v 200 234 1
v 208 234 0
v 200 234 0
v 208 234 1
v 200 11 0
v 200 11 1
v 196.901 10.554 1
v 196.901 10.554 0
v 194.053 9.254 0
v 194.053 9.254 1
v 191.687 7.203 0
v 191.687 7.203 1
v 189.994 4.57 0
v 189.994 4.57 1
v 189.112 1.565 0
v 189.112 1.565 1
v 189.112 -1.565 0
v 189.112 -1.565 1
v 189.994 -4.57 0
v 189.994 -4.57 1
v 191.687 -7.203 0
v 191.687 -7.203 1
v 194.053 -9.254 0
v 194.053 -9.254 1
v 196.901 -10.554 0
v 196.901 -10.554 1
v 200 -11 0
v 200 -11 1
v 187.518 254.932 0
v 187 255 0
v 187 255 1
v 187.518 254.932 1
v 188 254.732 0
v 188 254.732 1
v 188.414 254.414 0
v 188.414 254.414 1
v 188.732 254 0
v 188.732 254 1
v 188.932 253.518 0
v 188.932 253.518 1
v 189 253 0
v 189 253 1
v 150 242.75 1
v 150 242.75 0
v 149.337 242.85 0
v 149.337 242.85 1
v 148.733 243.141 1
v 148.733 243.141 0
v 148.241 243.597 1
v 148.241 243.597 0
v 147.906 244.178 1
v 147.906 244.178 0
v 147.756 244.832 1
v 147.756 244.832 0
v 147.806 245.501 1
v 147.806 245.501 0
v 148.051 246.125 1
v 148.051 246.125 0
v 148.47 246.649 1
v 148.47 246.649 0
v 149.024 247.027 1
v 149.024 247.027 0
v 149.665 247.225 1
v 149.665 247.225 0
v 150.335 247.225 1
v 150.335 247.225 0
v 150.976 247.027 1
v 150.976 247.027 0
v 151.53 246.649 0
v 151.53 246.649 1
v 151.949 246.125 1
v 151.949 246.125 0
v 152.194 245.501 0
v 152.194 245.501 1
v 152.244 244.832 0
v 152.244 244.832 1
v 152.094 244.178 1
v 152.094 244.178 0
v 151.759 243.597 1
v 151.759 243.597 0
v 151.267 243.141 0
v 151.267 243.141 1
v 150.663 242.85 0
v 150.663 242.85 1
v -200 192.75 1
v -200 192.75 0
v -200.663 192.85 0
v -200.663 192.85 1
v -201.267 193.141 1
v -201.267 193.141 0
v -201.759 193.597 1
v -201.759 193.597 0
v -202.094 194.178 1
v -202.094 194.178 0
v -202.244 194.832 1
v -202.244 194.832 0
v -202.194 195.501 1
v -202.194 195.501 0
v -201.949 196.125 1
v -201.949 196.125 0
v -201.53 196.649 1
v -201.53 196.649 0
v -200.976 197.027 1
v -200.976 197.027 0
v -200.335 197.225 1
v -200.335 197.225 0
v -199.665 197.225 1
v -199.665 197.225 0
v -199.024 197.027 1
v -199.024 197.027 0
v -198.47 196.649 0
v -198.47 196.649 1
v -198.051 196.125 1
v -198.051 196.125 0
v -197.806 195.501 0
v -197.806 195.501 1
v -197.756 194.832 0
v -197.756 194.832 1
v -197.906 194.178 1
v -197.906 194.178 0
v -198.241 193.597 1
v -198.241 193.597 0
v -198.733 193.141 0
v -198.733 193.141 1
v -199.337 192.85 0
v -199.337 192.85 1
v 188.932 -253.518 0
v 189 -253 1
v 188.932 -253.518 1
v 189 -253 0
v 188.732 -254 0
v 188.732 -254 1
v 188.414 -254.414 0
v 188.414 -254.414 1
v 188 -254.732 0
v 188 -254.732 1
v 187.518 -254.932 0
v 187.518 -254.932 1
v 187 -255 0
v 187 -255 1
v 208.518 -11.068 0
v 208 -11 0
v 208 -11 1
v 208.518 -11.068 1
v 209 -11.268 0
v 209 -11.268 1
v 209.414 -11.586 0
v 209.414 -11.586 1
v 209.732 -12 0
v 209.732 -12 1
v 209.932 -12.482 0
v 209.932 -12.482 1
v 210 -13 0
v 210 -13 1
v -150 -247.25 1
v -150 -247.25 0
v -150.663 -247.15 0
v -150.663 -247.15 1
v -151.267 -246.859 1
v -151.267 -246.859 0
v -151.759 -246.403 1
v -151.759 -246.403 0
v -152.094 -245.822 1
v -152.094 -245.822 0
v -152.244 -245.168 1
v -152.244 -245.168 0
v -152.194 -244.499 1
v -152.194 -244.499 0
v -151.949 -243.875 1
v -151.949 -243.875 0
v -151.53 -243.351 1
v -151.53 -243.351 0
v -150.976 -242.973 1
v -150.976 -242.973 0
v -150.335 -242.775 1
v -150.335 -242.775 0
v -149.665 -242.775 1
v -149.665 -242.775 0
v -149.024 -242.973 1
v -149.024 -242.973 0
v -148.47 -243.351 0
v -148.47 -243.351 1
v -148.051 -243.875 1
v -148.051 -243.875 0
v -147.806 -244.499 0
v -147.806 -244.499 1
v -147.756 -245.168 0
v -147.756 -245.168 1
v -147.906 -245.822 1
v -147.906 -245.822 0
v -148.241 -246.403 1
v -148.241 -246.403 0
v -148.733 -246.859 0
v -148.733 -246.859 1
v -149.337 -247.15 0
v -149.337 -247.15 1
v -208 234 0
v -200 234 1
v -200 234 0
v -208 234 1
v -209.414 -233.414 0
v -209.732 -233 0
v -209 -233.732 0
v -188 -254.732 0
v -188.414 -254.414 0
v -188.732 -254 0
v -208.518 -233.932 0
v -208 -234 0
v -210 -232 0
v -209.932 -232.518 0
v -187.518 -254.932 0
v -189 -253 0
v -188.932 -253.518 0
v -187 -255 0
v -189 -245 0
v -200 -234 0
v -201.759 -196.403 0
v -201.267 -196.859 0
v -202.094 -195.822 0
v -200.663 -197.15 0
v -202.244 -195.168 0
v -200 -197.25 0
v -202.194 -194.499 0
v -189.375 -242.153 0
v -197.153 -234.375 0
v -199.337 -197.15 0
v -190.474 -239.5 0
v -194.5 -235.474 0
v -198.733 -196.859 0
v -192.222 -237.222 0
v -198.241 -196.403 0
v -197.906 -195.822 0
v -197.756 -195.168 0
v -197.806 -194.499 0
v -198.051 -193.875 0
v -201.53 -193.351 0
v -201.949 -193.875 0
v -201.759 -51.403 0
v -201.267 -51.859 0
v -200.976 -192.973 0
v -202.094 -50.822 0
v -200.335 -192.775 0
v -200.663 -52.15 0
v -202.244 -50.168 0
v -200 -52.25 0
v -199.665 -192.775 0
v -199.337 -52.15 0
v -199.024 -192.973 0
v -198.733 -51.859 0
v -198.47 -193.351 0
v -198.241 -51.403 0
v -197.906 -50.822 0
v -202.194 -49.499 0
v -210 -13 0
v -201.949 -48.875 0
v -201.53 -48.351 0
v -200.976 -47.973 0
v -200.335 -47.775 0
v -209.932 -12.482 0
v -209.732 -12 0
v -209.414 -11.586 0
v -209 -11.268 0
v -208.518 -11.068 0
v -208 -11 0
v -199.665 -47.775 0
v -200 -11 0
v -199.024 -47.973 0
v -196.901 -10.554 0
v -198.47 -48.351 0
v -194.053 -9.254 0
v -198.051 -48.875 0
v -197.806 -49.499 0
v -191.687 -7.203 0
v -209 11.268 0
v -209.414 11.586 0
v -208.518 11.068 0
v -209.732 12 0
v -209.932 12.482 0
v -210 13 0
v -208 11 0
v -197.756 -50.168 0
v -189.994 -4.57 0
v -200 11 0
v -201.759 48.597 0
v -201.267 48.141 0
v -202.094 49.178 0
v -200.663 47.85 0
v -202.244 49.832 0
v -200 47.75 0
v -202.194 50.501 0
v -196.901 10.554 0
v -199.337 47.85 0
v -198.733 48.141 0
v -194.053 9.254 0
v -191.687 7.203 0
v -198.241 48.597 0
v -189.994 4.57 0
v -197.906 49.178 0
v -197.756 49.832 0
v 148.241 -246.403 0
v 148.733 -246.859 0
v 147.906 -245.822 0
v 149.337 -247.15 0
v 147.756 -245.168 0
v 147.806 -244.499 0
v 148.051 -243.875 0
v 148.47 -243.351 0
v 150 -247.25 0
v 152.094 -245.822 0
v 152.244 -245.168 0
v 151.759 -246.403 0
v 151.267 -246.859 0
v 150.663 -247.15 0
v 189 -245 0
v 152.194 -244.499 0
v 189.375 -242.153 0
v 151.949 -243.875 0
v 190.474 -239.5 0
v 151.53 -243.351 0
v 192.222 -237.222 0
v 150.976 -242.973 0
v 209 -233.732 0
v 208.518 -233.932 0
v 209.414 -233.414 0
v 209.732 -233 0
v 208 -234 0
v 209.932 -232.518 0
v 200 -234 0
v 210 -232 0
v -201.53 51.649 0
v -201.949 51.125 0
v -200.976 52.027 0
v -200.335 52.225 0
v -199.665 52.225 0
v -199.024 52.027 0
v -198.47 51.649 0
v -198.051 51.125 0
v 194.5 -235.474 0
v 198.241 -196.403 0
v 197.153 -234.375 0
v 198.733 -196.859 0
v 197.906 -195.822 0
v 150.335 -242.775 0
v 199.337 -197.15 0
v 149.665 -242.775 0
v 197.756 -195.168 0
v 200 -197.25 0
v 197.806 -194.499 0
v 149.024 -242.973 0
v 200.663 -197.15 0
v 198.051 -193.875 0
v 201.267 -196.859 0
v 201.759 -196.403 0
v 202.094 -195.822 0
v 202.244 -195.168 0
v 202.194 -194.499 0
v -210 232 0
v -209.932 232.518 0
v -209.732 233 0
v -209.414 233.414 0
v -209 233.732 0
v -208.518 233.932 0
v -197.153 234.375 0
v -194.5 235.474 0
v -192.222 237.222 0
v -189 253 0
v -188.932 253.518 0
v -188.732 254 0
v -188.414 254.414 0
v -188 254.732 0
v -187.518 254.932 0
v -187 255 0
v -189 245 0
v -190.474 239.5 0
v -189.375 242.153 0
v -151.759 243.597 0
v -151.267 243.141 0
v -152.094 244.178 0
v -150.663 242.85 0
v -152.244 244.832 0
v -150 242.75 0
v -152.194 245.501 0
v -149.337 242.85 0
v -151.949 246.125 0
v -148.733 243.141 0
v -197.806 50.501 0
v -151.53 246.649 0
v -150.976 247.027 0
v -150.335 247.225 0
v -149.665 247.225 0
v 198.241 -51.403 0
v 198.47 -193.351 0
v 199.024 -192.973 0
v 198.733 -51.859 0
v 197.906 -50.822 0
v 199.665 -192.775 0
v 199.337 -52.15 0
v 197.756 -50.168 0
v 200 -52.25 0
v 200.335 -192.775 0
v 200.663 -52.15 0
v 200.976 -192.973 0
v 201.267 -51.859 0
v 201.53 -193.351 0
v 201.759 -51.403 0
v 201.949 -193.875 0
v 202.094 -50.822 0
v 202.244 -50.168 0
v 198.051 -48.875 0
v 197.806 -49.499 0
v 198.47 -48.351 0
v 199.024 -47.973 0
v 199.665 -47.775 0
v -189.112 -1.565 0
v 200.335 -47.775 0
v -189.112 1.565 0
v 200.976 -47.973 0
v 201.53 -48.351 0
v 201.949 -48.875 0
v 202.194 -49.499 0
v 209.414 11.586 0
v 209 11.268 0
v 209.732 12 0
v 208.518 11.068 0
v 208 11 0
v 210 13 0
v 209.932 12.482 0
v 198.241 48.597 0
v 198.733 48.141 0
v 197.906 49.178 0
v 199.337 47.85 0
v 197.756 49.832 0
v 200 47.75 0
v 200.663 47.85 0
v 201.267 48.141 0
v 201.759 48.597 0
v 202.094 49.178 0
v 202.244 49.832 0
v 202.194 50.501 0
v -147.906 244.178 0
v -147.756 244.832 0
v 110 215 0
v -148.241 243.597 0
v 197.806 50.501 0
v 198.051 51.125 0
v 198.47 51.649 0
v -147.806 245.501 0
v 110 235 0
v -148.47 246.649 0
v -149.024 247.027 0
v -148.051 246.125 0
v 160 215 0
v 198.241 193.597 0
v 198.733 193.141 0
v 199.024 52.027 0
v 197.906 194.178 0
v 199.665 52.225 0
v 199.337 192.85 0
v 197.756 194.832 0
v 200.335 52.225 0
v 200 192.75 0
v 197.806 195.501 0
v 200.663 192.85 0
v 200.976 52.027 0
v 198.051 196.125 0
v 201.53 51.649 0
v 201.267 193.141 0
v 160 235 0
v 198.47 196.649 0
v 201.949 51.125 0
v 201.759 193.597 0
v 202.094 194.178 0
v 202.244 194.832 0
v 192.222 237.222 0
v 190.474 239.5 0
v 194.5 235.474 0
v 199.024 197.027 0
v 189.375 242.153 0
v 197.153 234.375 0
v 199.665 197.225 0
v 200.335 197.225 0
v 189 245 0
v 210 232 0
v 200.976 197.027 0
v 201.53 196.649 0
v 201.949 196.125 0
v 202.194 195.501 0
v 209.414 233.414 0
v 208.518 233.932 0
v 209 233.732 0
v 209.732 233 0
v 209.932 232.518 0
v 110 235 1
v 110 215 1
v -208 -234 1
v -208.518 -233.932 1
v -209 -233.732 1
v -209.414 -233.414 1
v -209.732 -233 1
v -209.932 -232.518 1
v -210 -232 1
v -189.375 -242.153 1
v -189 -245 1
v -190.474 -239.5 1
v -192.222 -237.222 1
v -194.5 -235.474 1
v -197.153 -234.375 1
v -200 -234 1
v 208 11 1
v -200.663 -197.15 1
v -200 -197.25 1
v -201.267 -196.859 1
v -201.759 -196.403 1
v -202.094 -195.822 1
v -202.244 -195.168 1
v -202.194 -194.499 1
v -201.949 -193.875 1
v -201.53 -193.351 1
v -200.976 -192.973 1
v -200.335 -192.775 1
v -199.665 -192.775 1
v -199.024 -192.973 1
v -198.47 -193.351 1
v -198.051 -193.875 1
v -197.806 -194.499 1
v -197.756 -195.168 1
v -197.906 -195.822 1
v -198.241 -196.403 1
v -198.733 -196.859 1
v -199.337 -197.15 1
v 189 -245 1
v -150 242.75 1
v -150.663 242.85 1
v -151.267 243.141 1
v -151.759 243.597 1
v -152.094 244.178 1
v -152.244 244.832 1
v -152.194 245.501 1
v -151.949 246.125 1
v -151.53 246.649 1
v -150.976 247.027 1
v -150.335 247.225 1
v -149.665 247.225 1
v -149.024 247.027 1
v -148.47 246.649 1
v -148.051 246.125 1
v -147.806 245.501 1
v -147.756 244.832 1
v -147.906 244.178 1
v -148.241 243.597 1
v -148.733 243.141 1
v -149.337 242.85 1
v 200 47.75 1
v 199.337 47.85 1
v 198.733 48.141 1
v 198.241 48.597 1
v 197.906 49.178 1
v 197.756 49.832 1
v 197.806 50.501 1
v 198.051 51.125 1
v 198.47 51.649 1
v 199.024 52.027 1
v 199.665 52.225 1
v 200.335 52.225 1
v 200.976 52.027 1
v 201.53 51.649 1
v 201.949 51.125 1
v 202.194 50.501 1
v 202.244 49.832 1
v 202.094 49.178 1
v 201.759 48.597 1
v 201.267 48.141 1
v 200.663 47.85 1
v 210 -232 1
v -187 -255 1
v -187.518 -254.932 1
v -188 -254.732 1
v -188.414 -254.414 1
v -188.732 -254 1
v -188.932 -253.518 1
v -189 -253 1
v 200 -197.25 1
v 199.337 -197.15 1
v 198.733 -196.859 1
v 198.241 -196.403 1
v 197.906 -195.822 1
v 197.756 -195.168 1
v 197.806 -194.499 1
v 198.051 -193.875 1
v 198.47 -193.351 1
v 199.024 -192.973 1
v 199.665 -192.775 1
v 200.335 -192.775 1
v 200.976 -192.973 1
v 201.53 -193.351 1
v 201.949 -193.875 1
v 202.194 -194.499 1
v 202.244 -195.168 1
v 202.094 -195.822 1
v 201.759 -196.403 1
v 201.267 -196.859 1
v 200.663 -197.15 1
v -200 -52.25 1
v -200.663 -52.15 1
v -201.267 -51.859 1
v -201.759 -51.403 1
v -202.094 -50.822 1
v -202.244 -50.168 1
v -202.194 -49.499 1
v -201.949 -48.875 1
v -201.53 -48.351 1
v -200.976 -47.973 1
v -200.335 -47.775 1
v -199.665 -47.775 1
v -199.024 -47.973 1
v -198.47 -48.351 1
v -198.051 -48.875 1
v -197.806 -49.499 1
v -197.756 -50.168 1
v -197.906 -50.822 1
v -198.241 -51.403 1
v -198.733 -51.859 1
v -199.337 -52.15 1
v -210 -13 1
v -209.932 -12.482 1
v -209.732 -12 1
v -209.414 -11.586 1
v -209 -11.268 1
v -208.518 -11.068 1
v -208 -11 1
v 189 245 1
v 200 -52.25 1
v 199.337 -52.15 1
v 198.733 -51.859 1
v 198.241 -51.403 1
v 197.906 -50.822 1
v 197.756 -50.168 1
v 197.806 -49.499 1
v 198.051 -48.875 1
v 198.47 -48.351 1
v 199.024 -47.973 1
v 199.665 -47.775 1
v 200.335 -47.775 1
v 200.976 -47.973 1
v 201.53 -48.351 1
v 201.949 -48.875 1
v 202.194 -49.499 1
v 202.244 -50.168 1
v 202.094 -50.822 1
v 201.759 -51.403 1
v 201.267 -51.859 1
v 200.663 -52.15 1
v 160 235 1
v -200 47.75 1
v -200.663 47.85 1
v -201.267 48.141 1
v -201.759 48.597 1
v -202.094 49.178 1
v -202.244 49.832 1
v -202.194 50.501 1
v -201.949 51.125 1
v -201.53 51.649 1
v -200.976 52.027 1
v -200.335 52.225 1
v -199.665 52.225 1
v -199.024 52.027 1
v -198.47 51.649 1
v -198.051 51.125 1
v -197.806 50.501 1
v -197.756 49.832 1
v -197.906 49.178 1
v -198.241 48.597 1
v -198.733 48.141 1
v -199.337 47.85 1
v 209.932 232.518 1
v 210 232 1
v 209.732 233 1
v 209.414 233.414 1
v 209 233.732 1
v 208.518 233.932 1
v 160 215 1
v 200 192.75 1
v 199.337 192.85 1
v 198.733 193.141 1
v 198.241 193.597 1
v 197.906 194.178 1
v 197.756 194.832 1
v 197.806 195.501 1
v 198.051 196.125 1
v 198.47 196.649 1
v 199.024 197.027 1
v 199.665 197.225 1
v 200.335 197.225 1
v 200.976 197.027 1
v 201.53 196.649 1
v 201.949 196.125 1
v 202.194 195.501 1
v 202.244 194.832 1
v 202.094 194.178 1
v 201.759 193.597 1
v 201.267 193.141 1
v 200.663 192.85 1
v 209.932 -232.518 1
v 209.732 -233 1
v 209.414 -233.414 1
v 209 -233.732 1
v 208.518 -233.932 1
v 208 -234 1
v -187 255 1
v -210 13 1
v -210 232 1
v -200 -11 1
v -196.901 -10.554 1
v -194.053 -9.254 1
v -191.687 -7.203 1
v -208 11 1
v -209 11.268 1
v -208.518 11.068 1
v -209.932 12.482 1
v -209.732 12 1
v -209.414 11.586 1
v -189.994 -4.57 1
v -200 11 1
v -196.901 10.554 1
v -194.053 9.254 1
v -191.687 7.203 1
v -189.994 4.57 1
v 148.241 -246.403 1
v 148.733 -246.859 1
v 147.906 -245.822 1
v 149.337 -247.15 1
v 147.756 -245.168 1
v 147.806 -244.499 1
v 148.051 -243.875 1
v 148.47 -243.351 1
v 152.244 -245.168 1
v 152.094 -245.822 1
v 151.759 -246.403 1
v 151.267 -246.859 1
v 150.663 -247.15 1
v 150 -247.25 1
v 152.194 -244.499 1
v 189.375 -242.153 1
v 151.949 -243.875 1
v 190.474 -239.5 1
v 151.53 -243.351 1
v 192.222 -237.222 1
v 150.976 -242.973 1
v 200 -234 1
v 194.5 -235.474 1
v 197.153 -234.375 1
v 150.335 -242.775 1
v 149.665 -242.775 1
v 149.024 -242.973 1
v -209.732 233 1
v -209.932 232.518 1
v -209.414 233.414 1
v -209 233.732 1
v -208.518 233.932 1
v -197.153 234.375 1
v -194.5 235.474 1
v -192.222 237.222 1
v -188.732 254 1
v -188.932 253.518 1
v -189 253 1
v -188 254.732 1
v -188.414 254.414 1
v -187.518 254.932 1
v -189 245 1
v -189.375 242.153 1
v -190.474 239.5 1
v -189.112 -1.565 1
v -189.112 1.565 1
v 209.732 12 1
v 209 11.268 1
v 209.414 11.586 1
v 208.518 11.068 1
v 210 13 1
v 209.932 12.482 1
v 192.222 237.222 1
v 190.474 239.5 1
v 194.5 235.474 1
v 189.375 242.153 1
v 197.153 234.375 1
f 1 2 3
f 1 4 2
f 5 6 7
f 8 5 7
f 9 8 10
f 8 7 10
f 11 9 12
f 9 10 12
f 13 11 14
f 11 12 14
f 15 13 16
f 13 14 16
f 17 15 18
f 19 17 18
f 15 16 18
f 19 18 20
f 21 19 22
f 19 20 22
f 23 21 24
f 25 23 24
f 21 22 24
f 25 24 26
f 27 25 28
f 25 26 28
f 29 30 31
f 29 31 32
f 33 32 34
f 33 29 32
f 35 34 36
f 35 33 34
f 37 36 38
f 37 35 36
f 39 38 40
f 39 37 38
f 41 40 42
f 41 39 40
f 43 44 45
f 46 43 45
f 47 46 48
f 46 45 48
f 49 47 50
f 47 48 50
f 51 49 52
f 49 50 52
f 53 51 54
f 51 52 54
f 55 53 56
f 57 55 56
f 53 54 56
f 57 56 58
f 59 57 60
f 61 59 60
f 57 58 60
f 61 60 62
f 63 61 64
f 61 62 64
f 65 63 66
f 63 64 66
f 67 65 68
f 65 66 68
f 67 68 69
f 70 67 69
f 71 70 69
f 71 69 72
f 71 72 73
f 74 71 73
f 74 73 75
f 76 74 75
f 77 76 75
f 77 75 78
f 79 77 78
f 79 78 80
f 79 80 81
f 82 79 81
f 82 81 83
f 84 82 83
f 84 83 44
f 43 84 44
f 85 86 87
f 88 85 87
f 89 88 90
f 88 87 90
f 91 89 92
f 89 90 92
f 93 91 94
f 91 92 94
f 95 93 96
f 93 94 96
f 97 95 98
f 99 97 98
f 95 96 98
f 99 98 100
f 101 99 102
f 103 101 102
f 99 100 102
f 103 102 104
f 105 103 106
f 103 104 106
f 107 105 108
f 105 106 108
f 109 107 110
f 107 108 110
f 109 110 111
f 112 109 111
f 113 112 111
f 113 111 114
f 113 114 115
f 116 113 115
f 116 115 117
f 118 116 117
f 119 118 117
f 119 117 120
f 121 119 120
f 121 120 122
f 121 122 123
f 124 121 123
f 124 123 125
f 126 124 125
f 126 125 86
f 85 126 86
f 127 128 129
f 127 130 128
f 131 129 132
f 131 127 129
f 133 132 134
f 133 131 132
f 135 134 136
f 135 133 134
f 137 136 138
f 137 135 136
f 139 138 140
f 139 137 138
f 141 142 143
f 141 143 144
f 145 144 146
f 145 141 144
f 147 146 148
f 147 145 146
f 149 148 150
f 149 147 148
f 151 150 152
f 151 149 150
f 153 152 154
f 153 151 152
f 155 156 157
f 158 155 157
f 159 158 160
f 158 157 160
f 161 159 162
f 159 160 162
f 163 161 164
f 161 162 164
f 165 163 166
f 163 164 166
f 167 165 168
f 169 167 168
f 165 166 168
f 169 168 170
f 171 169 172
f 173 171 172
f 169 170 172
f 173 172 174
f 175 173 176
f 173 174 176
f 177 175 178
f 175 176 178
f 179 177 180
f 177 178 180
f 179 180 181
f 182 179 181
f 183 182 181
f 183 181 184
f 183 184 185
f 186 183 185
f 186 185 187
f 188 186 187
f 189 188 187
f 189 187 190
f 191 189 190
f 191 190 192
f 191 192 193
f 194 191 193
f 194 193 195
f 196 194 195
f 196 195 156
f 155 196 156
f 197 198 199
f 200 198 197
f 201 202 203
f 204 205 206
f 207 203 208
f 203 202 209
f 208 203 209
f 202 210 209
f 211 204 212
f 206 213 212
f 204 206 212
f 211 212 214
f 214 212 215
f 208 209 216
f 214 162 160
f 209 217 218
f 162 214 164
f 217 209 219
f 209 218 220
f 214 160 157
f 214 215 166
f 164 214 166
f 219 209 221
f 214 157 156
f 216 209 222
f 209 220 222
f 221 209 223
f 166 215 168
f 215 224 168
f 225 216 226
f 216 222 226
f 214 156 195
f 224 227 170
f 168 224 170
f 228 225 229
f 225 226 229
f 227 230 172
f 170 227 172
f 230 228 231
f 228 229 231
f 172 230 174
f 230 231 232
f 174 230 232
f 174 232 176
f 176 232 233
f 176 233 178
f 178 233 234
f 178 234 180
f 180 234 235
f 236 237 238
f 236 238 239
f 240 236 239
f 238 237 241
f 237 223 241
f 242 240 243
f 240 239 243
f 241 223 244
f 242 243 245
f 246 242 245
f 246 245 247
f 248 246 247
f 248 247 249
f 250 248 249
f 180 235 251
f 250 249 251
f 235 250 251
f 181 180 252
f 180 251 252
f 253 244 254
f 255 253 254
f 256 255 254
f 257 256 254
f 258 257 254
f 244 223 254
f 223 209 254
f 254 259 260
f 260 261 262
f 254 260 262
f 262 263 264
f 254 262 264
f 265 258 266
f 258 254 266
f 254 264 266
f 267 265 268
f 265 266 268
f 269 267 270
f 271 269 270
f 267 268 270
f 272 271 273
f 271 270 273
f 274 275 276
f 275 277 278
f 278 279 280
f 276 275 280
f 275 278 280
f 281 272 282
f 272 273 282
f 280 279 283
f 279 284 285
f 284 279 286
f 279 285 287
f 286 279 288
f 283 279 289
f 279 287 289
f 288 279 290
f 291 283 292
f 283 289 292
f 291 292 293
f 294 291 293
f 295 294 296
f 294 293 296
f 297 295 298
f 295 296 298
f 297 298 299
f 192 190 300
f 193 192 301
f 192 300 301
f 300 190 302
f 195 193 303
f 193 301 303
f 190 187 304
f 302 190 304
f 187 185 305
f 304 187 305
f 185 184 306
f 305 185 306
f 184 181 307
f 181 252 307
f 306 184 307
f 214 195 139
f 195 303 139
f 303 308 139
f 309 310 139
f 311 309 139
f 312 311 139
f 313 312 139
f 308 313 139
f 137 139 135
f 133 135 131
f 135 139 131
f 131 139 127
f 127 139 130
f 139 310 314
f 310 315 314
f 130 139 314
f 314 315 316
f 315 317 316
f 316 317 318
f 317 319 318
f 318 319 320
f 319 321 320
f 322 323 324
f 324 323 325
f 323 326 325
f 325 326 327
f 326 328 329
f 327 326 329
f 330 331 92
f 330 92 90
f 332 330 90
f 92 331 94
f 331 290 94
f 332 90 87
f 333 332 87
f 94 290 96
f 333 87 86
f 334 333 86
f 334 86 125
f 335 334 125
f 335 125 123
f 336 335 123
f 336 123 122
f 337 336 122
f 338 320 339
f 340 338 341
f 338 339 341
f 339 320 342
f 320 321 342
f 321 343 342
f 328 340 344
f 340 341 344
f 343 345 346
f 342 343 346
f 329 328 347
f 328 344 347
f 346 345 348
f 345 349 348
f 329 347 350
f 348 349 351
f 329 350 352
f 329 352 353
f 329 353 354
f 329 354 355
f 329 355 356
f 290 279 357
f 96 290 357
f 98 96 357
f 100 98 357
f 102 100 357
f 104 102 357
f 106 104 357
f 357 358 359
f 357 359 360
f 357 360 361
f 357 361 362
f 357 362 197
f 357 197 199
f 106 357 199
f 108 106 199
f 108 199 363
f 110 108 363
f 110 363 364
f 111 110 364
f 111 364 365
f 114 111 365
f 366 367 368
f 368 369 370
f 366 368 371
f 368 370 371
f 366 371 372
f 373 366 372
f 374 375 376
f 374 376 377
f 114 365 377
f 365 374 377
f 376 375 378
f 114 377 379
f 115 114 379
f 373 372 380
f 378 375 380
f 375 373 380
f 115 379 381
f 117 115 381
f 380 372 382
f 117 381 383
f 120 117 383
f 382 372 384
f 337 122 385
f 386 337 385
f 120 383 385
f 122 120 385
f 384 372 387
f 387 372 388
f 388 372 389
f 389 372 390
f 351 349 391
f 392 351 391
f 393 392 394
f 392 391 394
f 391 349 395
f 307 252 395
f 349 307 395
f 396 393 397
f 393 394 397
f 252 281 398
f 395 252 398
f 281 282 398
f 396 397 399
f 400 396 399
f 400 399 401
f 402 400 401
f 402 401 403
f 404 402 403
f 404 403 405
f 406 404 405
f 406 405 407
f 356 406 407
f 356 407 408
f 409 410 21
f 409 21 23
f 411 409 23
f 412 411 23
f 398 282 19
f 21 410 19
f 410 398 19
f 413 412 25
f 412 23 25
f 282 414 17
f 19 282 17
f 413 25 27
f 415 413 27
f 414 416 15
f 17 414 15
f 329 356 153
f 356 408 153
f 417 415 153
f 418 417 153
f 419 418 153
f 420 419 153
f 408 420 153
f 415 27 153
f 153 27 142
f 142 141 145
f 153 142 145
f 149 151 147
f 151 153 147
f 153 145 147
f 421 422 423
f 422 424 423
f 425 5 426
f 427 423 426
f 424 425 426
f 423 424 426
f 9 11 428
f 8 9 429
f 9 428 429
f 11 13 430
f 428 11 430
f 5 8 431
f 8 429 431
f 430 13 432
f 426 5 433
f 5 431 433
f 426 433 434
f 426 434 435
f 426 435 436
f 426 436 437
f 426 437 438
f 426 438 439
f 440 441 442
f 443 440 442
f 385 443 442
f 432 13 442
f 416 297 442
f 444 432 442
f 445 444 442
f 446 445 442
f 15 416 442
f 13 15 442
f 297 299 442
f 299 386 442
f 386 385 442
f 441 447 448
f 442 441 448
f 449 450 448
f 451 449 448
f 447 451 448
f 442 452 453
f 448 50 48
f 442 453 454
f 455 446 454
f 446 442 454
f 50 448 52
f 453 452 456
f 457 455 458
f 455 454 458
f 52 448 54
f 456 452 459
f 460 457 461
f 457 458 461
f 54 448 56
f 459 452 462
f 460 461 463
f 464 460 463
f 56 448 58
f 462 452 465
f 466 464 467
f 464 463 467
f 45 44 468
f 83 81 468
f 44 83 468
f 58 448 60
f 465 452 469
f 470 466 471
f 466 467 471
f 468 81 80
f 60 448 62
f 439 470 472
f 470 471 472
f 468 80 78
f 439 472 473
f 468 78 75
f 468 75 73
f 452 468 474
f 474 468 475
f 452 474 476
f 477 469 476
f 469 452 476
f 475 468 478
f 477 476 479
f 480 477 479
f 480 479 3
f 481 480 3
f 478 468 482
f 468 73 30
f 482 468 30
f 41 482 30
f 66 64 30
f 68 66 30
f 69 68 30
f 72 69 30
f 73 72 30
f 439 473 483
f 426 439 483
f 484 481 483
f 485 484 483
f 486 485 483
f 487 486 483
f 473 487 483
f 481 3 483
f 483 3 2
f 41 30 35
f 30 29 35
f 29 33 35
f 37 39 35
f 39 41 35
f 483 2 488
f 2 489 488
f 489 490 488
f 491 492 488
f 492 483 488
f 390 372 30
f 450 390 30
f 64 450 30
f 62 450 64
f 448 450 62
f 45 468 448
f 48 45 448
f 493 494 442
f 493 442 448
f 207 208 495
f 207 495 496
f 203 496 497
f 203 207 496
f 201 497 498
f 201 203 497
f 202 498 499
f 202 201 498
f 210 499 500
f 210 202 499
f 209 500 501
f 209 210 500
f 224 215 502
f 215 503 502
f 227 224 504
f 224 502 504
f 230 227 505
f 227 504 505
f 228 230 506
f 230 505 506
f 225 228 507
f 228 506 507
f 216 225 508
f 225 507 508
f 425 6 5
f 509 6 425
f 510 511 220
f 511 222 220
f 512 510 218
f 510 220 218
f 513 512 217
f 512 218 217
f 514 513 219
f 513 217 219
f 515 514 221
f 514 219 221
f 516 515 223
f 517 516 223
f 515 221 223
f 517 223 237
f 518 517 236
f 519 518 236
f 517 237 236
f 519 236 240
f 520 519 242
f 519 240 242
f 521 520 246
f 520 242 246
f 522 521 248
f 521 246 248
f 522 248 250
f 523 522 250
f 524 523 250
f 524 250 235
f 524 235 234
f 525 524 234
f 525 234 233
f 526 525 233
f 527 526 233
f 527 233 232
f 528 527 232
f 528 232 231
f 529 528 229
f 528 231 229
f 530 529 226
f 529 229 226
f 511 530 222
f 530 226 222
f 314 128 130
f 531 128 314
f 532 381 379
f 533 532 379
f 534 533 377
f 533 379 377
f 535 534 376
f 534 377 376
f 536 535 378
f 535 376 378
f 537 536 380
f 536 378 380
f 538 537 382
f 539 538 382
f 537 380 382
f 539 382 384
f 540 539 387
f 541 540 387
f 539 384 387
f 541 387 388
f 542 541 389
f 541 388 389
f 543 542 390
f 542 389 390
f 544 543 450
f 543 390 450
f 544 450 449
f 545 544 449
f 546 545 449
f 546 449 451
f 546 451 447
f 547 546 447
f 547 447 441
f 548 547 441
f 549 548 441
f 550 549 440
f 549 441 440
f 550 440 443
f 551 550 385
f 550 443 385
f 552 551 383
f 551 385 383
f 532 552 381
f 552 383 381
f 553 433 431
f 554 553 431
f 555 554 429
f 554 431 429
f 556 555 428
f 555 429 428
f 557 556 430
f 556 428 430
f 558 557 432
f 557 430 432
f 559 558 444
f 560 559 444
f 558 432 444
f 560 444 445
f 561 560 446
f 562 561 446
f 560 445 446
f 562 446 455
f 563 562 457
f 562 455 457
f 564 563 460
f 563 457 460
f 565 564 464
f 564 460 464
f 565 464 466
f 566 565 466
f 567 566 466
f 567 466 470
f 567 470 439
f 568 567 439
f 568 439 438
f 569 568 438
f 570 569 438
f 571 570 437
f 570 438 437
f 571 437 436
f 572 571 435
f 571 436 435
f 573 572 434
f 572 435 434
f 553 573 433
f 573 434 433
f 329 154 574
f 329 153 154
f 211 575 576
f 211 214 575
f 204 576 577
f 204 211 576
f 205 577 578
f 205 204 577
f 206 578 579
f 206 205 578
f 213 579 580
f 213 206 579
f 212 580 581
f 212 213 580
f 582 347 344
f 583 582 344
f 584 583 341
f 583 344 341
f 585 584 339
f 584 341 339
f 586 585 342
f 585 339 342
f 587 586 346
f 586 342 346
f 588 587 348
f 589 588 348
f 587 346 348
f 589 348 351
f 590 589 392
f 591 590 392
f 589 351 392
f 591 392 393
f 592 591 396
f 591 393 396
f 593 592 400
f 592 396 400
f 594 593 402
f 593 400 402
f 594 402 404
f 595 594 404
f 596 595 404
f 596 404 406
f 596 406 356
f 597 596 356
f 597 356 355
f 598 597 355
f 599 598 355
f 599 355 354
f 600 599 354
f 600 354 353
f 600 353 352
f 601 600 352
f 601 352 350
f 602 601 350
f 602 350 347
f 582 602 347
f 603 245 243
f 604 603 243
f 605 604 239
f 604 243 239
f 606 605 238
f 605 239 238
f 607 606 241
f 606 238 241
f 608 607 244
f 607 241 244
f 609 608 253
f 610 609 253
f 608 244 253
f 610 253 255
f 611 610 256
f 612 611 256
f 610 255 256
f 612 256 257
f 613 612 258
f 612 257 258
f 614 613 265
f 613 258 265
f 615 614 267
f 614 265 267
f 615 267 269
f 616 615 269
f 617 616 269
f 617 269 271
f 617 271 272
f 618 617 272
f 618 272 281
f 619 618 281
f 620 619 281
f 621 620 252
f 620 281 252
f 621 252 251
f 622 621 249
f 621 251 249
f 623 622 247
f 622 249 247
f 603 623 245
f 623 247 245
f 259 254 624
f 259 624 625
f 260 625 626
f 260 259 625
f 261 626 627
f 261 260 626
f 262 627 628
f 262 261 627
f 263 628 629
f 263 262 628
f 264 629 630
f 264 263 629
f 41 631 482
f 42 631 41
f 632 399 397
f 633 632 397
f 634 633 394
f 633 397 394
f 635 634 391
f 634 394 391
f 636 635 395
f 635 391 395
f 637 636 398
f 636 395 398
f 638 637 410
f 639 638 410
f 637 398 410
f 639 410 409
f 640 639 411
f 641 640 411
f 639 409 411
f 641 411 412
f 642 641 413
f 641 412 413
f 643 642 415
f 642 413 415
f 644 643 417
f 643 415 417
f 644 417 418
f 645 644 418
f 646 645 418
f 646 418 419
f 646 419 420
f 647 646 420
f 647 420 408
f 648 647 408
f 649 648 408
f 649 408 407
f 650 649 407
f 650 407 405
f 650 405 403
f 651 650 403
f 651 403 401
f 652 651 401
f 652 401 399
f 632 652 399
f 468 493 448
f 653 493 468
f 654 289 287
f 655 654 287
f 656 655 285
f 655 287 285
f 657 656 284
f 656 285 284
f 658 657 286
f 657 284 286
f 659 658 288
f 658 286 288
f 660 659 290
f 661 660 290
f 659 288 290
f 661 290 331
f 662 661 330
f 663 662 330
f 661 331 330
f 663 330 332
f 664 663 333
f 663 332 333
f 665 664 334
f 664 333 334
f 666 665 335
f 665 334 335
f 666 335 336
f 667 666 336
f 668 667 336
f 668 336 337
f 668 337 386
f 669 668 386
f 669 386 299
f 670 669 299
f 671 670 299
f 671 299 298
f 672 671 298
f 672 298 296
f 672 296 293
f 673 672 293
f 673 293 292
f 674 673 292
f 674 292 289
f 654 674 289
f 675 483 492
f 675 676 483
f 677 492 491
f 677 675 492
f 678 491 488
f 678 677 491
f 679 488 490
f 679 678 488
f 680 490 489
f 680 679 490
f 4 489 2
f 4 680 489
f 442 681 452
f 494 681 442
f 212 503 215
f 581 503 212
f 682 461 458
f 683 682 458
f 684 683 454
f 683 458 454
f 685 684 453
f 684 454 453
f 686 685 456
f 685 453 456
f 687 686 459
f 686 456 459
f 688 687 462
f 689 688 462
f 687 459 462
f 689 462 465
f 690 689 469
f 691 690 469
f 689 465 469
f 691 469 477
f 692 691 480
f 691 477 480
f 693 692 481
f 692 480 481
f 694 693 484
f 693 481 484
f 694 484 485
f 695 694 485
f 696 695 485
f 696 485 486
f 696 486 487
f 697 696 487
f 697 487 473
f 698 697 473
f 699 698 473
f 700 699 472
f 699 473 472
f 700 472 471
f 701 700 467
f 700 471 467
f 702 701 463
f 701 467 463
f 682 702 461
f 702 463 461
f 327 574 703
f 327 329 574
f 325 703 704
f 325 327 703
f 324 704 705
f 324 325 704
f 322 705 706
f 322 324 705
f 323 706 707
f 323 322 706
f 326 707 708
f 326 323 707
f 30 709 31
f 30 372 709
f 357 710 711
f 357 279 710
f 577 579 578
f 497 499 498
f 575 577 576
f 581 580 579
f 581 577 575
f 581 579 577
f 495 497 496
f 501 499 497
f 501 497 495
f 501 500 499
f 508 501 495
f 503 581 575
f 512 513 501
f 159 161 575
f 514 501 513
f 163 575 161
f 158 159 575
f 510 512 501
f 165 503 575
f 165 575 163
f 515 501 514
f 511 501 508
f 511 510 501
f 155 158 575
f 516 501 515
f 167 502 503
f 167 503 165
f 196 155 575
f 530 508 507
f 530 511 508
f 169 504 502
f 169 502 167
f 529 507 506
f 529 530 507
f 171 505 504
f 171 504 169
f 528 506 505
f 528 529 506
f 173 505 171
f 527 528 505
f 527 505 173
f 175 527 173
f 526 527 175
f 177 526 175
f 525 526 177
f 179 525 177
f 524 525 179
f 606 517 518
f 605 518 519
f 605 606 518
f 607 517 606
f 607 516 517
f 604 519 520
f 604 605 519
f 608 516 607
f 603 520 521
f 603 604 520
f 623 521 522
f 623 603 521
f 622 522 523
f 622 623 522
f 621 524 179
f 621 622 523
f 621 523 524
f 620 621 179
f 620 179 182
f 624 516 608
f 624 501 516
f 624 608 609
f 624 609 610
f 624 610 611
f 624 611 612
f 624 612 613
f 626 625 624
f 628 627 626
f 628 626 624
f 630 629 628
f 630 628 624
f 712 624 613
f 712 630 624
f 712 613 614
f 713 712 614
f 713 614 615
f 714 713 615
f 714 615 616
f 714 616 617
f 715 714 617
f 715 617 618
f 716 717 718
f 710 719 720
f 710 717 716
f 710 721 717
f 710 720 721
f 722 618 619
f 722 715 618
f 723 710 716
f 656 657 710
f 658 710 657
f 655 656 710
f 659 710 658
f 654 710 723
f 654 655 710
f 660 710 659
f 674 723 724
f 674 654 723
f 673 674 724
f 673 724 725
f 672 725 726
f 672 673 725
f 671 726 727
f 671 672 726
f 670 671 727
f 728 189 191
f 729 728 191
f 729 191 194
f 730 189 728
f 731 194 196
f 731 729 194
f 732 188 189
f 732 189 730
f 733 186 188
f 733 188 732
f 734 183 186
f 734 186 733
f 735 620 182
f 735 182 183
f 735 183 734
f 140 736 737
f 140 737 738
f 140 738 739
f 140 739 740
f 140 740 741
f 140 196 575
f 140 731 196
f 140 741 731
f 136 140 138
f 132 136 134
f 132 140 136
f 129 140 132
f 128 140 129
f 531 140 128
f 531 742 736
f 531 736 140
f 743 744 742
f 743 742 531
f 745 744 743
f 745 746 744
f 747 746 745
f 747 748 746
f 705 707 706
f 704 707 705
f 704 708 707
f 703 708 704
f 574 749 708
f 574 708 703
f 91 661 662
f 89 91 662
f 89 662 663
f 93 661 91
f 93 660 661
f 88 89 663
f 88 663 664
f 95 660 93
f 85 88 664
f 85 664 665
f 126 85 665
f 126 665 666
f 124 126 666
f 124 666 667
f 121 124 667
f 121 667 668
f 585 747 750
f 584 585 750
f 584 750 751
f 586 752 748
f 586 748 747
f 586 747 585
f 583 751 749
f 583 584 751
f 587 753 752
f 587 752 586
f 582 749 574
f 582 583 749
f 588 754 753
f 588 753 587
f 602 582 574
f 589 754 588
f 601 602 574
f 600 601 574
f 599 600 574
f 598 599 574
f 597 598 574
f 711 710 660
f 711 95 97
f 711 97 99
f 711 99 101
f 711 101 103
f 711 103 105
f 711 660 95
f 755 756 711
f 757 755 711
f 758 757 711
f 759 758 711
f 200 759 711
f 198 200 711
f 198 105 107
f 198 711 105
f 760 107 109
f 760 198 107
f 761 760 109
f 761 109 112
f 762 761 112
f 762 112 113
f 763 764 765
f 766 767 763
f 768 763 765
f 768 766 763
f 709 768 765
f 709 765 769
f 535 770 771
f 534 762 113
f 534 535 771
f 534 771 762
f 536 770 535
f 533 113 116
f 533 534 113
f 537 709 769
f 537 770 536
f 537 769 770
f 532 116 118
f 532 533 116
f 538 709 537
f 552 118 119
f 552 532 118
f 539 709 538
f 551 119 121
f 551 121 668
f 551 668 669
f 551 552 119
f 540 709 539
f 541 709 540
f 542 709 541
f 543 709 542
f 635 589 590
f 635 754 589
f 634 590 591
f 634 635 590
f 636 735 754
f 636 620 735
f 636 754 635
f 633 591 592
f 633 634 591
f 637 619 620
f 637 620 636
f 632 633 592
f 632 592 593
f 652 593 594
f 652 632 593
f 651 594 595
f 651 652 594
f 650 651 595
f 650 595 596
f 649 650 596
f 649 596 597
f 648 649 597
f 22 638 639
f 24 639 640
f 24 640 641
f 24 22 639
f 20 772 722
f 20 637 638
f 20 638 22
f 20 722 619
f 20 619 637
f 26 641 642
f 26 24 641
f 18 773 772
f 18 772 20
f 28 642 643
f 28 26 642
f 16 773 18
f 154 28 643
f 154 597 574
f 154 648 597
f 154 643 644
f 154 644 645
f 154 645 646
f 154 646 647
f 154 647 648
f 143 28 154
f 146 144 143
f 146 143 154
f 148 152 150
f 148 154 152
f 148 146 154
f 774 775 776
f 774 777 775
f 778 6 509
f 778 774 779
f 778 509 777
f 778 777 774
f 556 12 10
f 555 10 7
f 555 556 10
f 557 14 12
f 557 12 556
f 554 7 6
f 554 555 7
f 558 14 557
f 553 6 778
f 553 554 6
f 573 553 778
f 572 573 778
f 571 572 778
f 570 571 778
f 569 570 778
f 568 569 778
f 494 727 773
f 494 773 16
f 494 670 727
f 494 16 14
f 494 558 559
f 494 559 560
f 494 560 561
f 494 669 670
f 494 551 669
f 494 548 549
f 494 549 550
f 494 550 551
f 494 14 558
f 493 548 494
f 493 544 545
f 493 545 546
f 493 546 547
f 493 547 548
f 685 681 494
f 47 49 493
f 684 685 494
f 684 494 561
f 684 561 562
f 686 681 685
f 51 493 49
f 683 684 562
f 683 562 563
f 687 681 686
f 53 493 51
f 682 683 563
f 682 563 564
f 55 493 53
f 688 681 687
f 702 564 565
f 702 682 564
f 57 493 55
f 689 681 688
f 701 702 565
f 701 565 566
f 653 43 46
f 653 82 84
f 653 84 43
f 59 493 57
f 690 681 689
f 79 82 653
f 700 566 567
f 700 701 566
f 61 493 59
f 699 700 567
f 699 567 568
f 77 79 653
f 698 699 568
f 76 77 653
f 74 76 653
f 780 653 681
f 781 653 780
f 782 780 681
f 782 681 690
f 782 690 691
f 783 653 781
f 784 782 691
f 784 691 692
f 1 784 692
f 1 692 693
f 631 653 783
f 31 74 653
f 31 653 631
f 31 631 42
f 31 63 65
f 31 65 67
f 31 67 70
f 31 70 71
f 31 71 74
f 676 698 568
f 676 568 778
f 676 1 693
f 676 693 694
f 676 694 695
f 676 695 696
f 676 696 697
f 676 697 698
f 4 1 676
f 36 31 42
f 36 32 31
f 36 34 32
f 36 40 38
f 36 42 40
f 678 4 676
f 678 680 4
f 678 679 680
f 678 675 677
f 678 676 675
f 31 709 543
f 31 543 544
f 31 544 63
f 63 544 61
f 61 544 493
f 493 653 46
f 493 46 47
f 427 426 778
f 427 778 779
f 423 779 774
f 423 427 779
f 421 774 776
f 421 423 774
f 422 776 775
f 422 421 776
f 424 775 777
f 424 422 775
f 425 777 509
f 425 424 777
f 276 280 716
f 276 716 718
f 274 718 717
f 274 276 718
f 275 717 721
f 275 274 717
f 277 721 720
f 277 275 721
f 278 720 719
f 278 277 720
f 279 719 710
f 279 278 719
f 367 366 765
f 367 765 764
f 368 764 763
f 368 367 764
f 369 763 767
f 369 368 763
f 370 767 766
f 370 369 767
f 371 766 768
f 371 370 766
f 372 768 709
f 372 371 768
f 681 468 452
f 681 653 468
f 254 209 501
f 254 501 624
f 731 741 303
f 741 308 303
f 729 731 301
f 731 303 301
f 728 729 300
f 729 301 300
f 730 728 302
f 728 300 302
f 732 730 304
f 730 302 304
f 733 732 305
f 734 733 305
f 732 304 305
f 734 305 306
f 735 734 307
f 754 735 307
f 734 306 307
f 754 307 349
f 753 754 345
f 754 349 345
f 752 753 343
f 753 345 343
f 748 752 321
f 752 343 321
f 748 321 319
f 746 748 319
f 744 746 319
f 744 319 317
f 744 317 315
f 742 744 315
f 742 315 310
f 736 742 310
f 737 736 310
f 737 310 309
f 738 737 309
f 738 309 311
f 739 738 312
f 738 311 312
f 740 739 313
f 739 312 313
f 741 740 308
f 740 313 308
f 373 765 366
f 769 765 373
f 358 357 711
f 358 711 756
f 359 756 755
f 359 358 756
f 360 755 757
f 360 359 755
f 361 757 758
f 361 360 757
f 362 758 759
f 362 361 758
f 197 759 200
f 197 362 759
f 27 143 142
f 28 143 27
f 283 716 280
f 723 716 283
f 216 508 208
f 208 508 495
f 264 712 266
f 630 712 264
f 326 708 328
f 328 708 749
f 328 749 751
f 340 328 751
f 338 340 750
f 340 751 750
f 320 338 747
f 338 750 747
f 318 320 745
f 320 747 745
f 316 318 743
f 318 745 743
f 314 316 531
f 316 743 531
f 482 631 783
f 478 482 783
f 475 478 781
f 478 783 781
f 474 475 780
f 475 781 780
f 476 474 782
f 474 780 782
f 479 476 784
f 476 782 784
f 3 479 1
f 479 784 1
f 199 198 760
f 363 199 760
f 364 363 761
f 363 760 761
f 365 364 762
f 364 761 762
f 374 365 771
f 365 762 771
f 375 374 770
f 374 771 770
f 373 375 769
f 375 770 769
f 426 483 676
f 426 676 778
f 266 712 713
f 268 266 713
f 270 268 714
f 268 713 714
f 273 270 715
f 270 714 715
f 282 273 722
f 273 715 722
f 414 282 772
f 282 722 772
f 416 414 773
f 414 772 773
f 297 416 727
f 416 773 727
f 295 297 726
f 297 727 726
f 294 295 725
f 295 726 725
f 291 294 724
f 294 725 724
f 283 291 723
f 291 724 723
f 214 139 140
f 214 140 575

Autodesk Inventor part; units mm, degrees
ref_plane "YZ Plane" through (0, 0, 0) normal (1, 0, 0) x (0, 1, 0)
ref_plane "XZ Plane" through (0, 0, 0) normal (0, 1, 0) x (-1, 0, 0)
ref_plane "XY Plane" through (0, 0, 0) normal (0, 0, 1) x (1, 0, 0)
sketch "スケッチ1" plane through (0, 0, 0) normal (0, 0, 1) x (1, 0, 0)
  line L0 (210, -255) -> (-210, -255)
  line L1 (-210, -255) -> (-210, 255)
  line L2 (-210, 255) -> (210, 255)
  line L3 (210, 255) -> (210, -255)
  line L4 (210, -255) -> (-210, 255) construction
  line L5 (-210, -255) -> (210, 255) construction
  point P0 (0, 0)
  dimension "d0" = 510
  dimension "d1" = 420
extrude "プレート1" add sketch "スケッチ1" along normal blind 1
sketch "スケッチ2" plane through (0, 0, 1) normal (0, 0, 1) x (1, 0, 0)
  line L0 (-210, -255) -> (-210, 255) projected
  line L1 (210, -255) -> (-210, -255) projected
  line L2 (210, 255) -> (210, -255) projected
  line L3 (-210, 255) -> (210, 255) projected
  line L4 (189, 234) -> (189, -234)
  line L5 (189, -234) -> (-189, -234)
  line L6 (-189, -234) -> (-189, 234)
  line L7 (-189, 234) -> (189, 234)
  line L8 (200, 245) -> (200, -245)
  line L9 (200, -245) -> (-200, -245)
  line L10 (-200, -245) -> (-200, 245)
  line L11 (-200, 245) -> (200, 245)
  circle A0 centre (-200, 245) radius 11
  circle A1 centre (-200, -245) radius 11
  circle A2 centre (200, -245) radius 11
  circle A3 centre (200, 245) radius 11
  circle A4 centre (-200, 0) radius 11
  circle A5 centre (200, 0) radius 11
  line L12 (-296, 11) -> (393, 11)
  line L13 (393, 11) -> (393, -11)
  line L14 (393, -11) -> (-296, -11)
  line L15 (-296, -11) -> (-296, 11)
  line L16 (-292, 336) -> (-189, 336)
  line L17 (-189, 336) -> (-189, -344)
  line L18 (-189, -344) -> (-292, -344)
  line L19 (-292, -344) -> (-292, 336)
  line L20 (354, -311) -> (189, -311)
  line L21 (189, -311) -> (189, 377)
  line L22 (189, 377) -> (354, 377)
  line L23 (354, 377) -> (354, -311)
  line L24 (-371, 292) -> (290, 292)
  line L25 (290, 292) -> (290, 234)
  line L26 (290, 234) -> (-371, 234)
  line L27 (-371, 234) -> (-371, 292)
  line L28 (-371, -325) -> (335, -325)
  line L29 (335, -325) -> (335, -234)
  line L30 (335, -234) -> (-371, -234)
  line L31 (-371, -234) -> (-371, -325)
  point P0 (0, 0)
  point P1 (200, 11)
  point P2 (200, -11)
  point P3 (210, -11)
  point P4 (210, 11)
  point P5 (210, -234)
  point P6 (200, -234)
  point P7 (189, -245)
  point P8 (189, -255)
  point P9 (-189, -245)
  point P10 (-200, -234)
  point P11 (-210, -234)
  point P12 (-189, -255)
  point P13 (-200, 11)
  point P14 (-210, 11)
  point P15 (-210, -11)
  point P16 (-200, -11)
  point P17 (-210, 234)
  point P18 (-200, 234)
  point P19 (-189, 245)
  point P20 (-189, 255)
  point P21 (189, 245)
  point P22 (200, 234)
  point P23 (210, 234)
  point P24 (189, 255)
  point P25 (210, 249.5826)
  point P26 (195.4174, 255)
  point P27 (-189, 245)
  point P28 (189, 245)
  point P29 (200, 234)
  point P30 (200, 234)
  point P31 (204.5826, 255)
  dimension "d3" = 21
  dimension "d4" = 10
  dimension "d5" = 22
  dimension "d6" = 22
  dimension "d7" = 22
  dimension "d8" = 22
  dimension "d9" = 22
  dimension "d10" = 22
extrude "押し出し1" cut sketch "スケッチ2" against normal blind 10 contours L0 A1 L1 | L0 A1 L10 L9 L1 | L0 L30 A1 | A1 L17 L1 | A1 L9 L10 | L0 A4 L14 | A4 L0 L10 | L10 A4 | L21 A2 L1 | A2 L8 L9 | L9 L8 A2 L2 L1 | A4 L0 L12 | L30 L2 A2 | A0 L0 L3 L11 L10 | L26 L0 A0 | L10 L11 A0 | A2 L2 L1 | A5 L8 | L8 A5 L2 | A5 L2 L14 | L26 L27 L24 L19 | L19 L24 L17 L3 A0 L0 L26 | A0 L0 | A0 L3 L17 | L12 L2 A5 | L0 L3 A0 | A3 L3 L2 L8 L11 | L21 L3 A3 | L11 L8 A3 | L3 A0 | L17 L24 L21 L3 | A3 L2 L26 | A3 L3 | L3 L21 L24 L25 L26 L2 A3 | L2 A3 | L3 L2 A3
fillet "フィレット1" radius 2 12 edges at (-210, 11, 0.5) (-210, -11, 0.5) (-210, 234, 0.5) (-189, 255, 0.5) (189, 255, 0.5) (210, 234, 0.5) (210, 11, 0.5) (210, -11, 0.5) (210, -234, 0.5) (189, -255, 0.5) (-210, -234, 0.5) (-189, -255, 0.5)
sketch "スケッチ3" plane through (0, 0, 1) normal (0, 0, 1) x (1, 0, 0)
  arc A0 (-189, -253) -> (-187, -255) centre (-187, -253) ccw projected
  line L0 (187, -255) -> (-187, -255) projected
  arc A1 (187, -255) -> (189, -253) centre (187, -253) ccw projected
  line L1 (189, -253) -> (189, -245) projected
  arc A2 (200, -234) -> (189, -245) centre (200, -245) ccw projected
  line L2 (200, -234) -> (208, -234) projected
  arc A3 (208, -234) -> (210, -232) centre (208, -232) ccw projected
  line L3 (210, -13) -> (210, -232) projected
  arc A4 (210, -13) -> (208, -11) centre (208, -13) ccw projected
  line L4 (208, -11) -> (200, -11) projected
  arc A5 (200, 11) -> (200, -11) centre (200, 0) ccw projected
  line L5 (200, 11) -> (208, 11) projected
  arc A6 (208, 11) -> (210, 13) centre (208, 13) ccw projected
  line L6 (210, 232) -> (210, 13) projected
  arc A7 (210, 232) -> (208, 234) centre (208, 232) ccw projected
  line L7 (208, 234) -> (200, 234) projected
  arc A8 (189, 245) -> (200, 234) centre (200, 245) ccw projected
  line L8 (189, 245) -> (189, 253) projected
  arc A9 (189, 253) -> (187, 255) centre (187, 253) ccw projected
  line L9 (-187, 255) -> (187, 255) projected
  arc A10 (-187, 255) -> (-189, 253) centre (-187, 253) ccw projected
  line L10 (-189, 253) -> (-189, 245) projected
  arc A11 (-200, 234) -> (-189, 245) centre (-200, 245) ccw projected
  line L11 (-200, 234) -> (-208, 234) projected
  arc A12 (-208, 234) -> (-210, 232) centre (-208, 232) ccw projected
  line L12 (-210, 13) -> (-210, 232) projected
  arc A13 (-210, 13) -> (-208, 11) centre (-208, 13) ccw projected
  line L13 (-208, 11) -> (-200, 11) projected
  arc A14 (-200, -11) -> (-200, 11) centre (-200, 0) ccw projected
  line L14 (-200, -11) -> (-208, -11) projected
  arc A15 (-208, -11) -> (-210, -13) centre (-208, -13) ccw projected
  line L15 (-210, -232) -> (-210, -13) projected
  arc A16 (-210, -232) -> (-208, -234) centre (-208, -232) ccw projected
  line L16 (-208, -234) -> (-200, -234) projected
  arc A17 (-189, -245) -> (-200, -234) centre (-200, -245) ccw projected
  line L17 (-189, -245) -> (-189, -253) projected
  line L18 (200, -245) -> (-200, -245)
  line L19 (-200, -245) -> (-200, 245)
  line L20 (-200, 245) -> (200, 245)
  line L21 (200, 245) -> (200, -245)
  line L22 (200, -245) -> (-200, 245) construction
  line L23 (-200, -245) -> (200, 245) construction
  point P0 (0, 0)
  point P1 (-150, 245)
  point P2 (150, 245)
  point P3 (-200, 195)
  point P4 (-200, 50)
  point P5 (200, 50)
  point P6 (200, 195)
  point P7 (200, -195)
  point P8 (200, -50)
  point P9 (150, -245)
  point P10 (-150, -245)
  point P11 (-200, -195)
  point P12 (-200, -50)
  dimension "d14" = 10
  dimension "d15" = 10
  dimension "d16" = 150
  dimension "d17" = 300
  dimension "d18" = 145
  dimension "d19" = 50
  dimension "d20" = 145
  dimension "d21" = 50
hole "穴1" at (-150, 245, 1) at (150, 245, 1) at (-200, 195, 1) at (-200, 50, 1) at (200, 50, 1) at (200, 195, 1) at (200, -195, 1) at (200, -50, 1) at (150, -245, 1) at (-150, -245, 1) at (-200, -195, 1) at (-200, -50, 1) direction (0, 0, -1) diameter 4.5 depth 1 tip angle 118
sketch "スケッチ4" plane through (0, 0, 1) normal (0, 0, 1) x (1, 0, 0)
  line L0 (190, -235) -> (-190, -235)
  line L1 (-190, -235) -> (-190, 235)
  line L2 (-190, 235) -> (190, 235)
  line L3 (190, 235) -> (190, -235)
  line L4 (190, -235) -> (-190, 235) construction
  line L5 (-190, -235) -> (190, 235) construction
  line L6 (-187, 255) -> (187, 255) projected
  line L7 (-210, 13) -> (-210, 232) projected
  line L8 (110, 235) -> (160, 235)
  line L9 (160, 235) -> (160, 215)
  line L10 (160, 215) -> (110, 215)
  line L11 (110, 215) -> (110, 235)
  point P0 (0, 0)
  point P1 (135, 215)
  point P2 (160, 235)
  dimension "d29" = 20
  dimension "d30" = 20
  dimension "d31" = 20
  dimension "d32" = 50
  dimension "d33" = 135
extrude "押し出し2" cut sketch "スケッチ4" against normal blind 10 contours L9 L10 L11 L2
equation "\"d27\" = Thickness"
equation "\"d2\" = Thickness"
equation "\"BendRadius\" = Thickness"
equation "\"BendReliefWidth\" = Thickness"
equation "\"BendReliefDepth\" = 0.5 * Thickness"
equation "\"CornerReliefSize\" = 4 * Thickness"
equation "\"MinimumRemnant\" = 2 * Thickness"
equation "\"TransitionRadius\" = BendRadius"
equation "\"JacobiRadiusSize\" = BendRadius"
equation "\"GapSize\" = Thickness"
equation "\"Thickness\" = 1"
properties part number "Bottom_Plate"
